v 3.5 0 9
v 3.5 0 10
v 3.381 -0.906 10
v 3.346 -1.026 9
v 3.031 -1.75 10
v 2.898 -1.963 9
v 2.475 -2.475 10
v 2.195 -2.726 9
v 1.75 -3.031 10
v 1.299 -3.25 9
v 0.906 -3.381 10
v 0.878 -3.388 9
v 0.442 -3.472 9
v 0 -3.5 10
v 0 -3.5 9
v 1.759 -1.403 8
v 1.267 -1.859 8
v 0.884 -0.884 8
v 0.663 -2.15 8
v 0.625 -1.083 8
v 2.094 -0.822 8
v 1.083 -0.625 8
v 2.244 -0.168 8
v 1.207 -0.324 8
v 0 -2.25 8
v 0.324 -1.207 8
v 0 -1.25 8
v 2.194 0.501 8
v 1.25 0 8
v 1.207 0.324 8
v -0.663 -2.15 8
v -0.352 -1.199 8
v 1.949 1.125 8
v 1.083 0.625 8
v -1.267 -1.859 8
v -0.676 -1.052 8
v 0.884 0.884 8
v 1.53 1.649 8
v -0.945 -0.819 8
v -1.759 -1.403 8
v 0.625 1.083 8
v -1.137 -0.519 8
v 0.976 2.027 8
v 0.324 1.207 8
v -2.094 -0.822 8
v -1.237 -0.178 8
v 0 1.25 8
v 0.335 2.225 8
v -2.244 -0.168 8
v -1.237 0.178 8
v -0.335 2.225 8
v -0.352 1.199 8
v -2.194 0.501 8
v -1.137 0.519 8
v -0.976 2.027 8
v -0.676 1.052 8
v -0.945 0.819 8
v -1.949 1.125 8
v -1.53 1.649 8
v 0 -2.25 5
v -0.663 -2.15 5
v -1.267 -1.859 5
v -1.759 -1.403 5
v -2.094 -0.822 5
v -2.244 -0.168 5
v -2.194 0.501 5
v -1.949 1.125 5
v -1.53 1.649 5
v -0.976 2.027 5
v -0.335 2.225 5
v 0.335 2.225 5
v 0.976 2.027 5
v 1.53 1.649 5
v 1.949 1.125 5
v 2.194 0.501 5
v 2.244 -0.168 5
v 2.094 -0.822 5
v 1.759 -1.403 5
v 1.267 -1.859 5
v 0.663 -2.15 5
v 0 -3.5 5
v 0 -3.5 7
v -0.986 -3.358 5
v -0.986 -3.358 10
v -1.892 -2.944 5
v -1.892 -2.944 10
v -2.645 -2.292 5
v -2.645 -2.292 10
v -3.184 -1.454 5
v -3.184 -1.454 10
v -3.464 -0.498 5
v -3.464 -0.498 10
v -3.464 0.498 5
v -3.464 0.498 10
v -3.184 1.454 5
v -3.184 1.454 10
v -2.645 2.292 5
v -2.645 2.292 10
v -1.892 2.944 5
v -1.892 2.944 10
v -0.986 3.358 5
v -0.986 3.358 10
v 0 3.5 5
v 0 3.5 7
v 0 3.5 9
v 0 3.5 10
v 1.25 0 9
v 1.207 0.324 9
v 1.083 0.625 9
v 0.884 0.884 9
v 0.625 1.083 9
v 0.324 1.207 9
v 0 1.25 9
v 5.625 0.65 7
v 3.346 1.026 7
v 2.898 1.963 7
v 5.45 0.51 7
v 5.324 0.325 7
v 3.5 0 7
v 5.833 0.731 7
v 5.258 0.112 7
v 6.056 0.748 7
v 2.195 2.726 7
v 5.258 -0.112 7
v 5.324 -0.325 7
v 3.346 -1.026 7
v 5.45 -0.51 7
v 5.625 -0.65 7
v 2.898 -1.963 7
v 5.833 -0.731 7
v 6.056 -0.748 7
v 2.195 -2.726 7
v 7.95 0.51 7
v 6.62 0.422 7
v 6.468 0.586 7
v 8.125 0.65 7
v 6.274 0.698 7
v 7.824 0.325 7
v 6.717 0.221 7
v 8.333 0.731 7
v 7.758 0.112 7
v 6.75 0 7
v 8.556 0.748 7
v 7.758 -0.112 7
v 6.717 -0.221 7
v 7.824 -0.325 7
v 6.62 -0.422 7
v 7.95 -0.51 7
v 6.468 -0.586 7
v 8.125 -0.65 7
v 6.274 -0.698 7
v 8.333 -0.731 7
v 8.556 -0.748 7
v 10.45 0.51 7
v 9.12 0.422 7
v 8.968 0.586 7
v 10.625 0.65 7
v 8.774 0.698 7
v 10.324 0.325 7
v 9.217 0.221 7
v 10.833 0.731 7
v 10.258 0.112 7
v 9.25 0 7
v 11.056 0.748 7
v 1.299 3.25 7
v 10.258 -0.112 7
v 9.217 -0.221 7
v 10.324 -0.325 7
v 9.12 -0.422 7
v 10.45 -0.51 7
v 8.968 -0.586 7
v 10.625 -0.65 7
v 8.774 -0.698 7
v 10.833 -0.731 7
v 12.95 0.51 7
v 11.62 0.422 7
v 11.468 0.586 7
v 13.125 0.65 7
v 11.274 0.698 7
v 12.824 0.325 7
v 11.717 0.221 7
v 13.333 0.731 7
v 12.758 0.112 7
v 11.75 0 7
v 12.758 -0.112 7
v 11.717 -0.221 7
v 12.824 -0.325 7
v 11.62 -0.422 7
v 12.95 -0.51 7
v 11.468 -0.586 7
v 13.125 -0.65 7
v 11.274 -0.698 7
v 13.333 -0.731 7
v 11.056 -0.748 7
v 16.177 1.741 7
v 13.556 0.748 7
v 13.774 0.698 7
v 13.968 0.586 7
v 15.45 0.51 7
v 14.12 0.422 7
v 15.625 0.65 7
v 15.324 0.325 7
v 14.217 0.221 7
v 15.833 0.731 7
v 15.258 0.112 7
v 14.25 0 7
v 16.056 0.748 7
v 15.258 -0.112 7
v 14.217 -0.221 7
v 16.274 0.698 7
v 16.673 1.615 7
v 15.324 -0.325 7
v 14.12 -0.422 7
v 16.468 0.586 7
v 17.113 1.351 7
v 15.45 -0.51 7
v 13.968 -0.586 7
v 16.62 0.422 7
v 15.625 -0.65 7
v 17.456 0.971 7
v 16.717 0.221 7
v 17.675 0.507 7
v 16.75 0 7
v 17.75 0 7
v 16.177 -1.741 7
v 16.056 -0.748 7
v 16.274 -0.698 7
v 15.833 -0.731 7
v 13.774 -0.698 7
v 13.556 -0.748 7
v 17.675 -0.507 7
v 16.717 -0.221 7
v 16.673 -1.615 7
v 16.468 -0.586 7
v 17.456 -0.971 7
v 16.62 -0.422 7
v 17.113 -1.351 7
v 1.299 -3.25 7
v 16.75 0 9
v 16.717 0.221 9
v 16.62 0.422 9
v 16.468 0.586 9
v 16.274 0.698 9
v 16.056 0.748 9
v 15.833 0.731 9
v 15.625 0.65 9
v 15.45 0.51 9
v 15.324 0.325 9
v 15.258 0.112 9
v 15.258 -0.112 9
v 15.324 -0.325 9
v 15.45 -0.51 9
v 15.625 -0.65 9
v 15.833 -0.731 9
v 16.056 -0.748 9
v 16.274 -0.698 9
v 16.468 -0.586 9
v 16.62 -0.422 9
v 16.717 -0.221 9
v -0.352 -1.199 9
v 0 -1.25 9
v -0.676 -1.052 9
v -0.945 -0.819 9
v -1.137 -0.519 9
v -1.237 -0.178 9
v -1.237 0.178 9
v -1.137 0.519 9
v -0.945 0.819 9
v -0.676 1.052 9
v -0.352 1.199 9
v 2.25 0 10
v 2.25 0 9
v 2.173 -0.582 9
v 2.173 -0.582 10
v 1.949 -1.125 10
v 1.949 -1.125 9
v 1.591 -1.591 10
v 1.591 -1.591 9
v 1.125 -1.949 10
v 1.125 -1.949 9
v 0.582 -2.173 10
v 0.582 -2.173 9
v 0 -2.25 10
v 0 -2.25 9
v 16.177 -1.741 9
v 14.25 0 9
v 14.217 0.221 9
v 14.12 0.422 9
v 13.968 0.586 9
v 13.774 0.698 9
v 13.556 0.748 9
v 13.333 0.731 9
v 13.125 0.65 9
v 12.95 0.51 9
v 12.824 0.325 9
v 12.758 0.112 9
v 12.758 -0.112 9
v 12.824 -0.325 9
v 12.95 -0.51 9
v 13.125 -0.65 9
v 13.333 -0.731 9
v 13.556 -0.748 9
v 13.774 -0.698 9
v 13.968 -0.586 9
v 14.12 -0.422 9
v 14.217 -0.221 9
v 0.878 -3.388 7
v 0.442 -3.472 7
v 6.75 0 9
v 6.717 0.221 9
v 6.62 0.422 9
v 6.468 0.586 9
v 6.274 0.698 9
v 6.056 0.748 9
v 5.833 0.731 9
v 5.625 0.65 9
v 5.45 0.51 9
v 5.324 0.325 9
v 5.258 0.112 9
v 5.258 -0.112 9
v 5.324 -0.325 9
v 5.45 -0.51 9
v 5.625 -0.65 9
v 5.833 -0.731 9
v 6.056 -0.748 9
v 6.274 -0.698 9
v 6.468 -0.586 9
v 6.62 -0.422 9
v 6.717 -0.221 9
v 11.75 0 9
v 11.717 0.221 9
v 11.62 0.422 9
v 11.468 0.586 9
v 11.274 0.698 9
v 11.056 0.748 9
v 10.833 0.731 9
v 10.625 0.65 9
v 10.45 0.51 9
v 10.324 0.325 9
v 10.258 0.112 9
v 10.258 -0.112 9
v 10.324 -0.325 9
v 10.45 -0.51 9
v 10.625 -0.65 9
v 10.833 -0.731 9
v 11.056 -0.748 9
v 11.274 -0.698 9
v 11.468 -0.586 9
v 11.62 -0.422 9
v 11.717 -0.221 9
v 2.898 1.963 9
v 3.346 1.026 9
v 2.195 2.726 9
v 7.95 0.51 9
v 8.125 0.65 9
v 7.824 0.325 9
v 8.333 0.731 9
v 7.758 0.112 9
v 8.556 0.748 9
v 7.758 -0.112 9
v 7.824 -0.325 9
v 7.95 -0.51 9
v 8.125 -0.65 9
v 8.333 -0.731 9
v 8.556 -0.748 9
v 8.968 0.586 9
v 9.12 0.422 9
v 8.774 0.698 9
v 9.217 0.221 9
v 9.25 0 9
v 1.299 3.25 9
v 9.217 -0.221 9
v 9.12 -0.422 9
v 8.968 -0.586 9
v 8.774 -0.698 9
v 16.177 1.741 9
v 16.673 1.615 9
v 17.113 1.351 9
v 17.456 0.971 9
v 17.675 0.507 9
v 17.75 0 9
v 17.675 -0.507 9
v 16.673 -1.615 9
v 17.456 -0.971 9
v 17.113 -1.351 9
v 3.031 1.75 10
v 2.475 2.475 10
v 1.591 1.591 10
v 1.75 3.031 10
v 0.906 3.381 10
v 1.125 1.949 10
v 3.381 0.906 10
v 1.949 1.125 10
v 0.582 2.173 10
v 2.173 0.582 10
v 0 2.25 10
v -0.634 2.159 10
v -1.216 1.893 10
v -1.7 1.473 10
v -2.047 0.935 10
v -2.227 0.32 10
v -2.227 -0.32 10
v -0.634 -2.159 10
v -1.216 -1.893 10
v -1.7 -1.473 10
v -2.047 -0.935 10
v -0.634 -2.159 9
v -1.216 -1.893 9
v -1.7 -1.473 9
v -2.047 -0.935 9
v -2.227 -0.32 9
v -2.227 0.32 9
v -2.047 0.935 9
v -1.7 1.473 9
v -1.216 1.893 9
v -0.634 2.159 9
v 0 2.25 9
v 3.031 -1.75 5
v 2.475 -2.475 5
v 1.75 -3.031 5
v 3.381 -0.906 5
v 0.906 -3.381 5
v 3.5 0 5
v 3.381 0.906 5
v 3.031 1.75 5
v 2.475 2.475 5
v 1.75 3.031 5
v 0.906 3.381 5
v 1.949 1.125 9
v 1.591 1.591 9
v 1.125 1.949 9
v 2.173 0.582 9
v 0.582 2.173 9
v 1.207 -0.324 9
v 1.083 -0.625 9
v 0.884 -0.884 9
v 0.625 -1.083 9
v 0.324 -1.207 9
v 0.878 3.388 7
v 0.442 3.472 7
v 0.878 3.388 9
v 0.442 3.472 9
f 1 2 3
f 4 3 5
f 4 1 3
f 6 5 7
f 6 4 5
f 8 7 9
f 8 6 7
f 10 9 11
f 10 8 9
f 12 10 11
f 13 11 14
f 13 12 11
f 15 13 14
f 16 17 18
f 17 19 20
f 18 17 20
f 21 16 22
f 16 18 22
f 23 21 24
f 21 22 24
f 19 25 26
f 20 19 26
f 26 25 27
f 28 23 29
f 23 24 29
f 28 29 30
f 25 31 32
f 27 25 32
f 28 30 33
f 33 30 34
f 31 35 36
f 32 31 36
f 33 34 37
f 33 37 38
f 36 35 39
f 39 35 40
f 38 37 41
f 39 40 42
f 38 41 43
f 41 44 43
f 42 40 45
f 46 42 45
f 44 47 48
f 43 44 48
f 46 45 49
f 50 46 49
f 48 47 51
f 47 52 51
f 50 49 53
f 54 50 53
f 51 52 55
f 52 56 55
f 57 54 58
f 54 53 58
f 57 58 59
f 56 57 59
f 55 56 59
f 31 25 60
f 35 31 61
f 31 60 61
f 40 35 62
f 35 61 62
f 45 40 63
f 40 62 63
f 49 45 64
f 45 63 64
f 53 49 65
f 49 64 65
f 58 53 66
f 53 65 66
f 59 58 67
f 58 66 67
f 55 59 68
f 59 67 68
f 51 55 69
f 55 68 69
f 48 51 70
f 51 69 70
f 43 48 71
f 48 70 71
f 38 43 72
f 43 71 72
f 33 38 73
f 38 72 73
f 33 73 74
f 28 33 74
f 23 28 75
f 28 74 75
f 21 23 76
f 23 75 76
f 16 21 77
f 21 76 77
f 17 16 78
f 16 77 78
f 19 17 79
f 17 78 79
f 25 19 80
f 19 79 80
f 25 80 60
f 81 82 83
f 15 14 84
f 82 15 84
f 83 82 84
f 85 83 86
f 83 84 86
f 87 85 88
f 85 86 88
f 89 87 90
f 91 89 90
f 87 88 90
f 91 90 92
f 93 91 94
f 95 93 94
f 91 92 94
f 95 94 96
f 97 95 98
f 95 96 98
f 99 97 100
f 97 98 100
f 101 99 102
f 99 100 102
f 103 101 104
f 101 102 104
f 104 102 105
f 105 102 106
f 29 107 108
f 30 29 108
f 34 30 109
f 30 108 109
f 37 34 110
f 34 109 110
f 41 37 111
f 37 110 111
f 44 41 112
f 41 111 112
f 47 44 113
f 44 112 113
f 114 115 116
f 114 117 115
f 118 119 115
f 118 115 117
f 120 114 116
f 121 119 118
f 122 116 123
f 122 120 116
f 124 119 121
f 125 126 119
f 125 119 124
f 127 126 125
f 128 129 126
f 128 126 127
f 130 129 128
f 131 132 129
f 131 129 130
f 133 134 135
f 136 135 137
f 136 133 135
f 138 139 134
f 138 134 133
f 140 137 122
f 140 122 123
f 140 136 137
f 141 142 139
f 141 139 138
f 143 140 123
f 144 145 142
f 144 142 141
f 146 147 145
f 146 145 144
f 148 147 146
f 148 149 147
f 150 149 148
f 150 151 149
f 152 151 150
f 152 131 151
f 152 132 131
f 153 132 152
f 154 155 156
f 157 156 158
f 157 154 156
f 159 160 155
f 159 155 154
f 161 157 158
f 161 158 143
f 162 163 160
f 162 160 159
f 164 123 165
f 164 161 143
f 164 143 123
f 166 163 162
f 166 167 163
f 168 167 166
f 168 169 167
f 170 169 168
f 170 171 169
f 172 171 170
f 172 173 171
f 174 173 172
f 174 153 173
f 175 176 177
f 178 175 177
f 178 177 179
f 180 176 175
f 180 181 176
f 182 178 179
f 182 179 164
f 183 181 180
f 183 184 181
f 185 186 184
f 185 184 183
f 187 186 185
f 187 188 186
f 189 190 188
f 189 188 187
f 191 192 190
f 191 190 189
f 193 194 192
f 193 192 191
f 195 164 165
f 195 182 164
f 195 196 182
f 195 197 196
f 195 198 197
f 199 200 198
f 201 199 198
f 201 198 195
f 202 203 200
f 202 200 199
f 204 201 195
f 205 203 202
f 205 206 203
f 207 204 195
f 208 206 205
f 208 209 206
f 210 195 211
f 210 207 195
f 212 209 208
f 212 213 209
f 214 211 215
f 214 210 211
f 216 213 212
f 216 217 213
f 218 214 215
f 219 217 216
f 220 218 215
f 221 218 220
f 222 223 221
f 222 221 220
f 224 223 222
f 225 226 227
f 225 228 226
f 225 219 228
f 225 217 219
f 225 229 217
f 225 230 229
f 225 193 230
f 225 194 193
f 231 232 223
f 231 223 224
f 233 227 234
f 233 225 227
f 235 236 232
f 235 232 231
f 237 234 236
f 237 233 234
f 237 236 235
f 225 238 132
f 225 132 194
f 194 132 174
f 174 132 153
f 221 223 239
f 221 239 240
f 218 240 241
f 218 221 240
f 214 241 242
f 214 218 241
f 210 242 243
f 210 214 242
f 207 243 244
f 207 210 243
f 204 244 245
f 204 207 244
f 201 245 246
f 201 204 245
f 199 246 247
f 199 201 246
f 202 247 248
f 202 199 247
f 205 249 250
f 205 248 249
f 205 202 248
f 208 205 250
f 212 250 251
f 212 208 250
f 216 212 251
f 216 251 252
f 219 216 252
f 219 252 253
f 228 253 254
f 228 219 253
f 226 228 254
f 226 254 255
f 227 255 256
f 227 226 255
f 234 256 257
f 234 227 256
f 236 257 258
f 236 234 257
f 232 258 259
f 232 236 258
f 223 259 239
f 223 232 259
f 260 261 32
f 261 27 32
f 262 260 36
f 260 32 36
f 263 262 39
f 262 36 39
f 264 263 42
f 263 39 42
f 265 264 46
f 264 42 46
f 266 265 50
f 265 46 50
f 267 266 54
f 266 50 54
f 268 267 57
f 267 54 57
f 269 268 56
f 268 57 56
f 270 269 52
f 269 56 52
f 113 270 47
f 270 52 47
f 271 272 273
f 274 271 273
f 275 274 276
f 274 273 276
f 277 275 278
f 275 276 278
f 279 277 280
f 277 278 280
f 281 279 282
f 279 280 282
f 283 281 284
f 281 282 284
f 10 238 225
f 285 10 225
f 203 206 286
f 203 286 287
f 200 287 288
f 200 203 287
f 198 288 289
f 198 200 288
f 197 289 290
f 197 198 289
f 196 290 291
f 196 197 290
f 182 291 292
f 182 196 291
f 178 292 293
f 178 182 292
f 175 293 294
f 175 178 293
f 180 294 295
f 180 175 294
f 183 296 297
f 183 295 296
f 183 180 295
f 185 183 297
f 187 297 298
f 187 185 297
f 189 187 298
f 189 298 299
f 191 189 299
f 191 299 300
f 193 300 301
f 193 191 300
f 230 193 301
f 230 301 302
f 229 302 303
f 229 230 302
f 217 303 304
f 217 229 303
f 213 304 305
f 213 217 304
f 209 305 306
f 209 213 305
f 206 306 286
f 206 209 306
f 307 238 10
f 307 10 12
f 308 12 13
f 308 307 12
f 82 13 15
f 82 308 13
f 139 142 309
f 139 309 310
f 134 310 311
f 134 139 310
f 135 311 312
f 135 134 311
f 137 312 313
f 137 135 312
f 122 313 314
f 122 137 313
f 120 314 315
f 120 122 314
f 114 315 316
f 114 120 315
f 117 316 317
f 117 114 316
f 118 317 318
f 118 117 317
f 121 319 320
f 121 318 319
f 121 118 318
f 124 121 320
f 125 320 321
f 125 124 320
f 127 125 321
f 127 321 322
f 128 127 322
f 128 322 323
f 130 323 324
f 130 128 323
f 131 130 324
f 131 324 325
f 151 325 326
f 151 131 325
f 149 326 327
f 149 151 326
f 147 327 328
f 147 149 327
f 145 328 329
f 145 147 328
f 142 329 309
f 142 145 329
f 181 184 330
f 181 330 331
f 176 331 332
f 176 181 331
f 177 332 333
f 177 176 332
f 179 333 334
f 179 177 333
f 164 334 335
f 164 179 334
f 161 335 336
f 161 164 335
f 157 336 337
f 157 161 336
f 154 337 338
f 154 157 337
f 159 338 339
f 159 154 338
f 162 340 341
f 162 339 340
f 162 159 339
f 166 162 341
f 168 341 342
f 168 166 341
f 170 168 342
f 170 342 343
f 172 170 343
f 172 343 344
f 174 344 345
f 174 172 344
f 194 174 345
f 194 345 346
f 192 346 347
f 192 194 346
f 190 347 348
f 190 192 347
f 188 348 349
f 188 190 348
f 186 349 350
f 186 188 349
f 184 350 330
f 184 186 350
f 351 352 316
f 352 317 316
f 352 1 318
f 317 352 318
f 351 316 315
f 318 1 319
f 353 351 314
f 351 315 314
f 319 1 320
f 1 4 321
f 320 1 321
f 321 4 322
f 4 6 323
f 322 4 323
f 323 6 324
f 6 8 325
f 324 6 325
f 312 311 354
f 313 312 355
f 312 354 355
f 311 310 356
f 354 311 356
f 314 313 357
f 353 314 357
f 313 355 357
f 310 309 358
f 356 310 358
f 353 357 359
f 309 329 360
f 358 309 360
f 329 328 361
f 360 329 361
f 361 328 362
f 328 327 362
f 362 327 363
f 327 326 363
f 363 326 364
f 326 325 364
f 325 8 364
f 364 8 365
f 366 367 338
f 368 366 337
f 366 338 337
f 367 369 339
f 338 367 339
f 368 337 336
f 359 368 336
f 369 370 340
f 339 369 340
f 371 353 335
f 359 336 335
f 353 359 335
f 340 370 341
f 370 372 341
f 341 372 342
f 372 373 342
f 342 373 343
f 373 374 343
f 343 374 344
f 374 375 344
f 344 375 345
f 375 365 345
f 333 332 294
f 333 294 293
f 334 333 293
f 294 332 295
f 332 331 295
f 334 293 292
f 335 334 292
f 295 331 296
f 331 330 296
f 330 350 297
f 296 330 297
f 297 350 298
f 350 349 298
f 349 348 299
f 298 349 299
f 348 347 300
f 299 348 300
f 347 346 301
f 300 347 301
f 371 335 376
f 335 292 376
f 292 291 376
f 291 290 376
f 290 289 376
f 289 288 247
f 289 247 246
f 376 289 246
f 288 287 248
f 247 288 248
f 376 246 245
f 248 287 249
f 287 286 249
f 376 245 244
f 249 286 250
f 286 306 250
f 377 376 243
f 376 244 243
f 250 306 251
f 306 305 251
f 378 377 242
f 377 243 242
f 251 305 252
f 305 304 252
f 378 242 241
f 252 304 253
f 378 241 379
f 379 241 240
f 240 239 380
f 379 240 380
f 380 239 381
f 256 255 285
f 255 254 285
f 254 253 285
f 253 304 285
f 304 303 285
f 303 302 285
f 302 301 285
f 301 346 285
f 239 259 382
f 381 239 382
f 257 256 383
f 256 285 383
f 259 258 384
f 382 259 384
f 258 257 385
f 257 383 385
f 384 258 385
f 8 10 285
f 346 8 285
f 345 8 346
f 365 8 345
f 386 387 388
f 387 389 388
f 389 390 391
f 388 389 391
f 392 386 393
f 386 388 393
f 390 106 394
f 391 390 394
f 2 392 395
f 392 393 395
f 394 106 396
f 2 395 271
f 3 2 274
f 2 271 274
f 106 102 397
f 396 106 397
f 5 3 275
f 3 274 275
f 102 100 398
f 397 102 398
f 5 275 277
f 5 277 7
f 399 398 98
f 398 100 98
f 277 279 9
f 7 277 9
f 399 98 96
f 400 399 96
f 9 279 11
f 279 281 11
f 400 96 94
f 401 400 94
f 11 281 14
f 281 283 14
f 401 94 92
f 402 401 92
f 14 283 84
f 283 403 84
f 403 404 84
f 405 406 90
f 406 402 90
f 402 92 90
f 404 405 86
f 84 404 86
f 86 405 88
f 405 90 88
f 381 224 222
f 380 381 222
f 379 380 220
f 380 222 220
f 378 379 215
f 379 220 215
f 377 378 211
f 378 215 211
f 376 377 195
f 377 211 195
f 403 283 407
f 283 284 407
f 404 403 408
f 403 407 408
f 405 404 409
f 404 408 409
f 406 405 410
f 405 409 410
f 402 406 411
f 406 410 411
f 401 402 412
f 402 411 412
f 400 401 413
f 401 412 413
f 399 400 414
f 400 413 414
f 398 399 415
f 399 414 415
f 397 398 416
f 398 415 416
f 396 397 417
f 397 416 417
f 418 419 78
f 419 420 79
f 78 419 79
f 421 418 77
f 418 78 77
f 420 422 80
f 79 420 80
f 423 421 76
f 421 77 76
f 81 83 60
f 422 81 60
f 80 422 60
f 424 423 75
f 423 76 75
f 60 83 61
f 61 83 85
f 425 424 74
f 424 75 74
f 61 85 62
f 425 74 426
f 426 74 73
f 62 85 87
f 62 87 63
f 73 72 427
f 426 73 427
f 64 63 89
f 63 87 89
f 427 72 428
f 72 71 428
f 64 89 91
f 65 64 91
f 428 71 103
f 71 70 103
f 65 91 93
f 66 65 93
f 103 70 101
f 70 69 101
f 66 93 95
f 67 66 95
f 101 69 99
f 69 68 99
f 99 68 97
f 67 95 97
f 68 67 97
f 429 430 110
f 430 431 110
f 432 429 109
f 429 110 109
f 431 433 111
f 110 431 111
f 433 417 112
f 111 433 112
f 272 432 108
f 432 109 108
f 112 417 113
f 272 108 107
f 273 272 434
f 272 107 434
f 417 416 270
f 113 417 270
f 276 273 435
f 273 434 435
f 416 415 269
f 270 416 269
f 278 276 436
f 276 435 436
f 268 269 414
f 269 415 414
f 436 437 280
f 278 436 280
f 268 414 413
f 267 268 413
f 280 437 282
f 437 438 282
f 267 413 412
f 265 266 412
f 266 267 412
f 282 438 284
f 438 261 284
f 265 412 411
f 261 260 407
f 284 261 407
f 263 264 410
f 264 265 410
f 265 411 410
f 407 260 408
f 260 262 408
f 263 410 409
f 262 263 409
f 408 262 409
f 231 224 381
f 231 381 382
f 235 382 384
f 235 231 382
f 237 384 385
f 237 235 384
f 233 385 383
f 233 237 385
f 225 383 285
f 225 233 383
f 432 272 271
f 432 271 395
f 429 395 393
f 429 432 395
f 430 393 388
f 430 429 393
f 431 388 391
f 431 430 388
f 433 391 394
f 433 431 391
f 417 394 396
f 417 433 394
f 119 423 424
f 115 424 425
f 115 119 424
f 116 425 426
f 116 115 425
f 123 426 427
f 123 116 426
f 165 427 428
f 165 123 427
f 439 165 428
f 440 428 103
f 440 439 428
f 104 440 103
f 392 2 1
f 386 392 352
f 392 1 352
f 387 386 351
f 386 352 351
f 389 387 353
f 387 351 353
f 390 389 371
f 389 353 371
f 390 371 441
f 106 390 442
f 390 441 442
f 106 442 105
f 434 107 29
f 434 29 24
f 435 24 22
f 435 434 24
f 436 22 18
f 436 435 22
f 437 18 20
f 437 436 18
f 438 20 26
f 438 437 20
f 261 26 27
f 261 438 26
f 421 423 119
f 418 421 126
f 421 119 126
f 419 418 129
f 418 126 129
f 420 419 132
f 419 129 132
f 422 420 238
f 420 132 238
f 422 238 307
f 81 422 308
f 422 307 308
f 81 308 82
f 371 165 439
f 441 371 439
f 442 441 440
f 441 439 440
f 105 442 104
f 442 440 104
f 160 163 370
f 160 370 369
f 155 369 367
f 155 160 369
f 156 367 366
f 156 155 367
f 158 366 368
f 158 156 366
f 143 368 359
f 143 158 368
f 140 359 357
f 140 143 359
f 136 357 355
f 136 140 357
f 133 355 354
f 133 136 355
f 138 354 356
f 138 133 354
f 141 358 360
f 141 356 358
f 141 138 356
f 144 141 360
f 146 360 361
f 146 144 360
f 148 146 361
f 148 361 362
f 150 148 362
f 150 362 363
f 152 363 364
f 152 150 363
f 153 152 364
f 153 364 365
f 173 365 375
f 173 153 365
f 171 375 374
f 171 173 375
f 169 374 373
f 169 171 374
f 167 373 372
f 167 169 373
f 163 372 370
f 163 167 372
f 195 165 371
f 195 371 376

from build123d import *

# Parameters (mm, degrees)
PAD004_DEPTH     = 2
PAD024_DEPTH     = 1
PAD025_DEPTH     = 2
SKETCH009_R      = 2.25
POCKET023_DEPTH  = 3
REVOLUTION_ANGLE = -180


with BuildPart() as part:
    # Sketch046 → Pad004 (new body)
    with BuildSketch(Plane.XY):
        with BuildLine():
            ThreePointArc((1.2990381057, 3.25), (0.6614378278, 3.4369317712), (0, 3.5))
            Line((0, 3.5), (0, 1.25))
            ThreePointArc((1.25, 0), (0.8838834765, 0.8838834765), (0, 1.25))
            Line((1.25, 0), (5.25, 0))
            ThreePointArc((6.75, 0), (6, 0.75), (5.25, 0))
            Line((6.75, 0), (7.75, 0))
            ThreePointArc((9.25, 0), (8.5, 0.75), (7.75, 0))
            Line((9.25, 0), (10.25, 0))
            ThreePointArc((11.75, 0), (11, 0.75), (10.25, 0))
            Line((11.75, 0), (12.75, 0))
            ThreePointArc((14.25, 0), (13.5, 0.75), (12.75, 0))
            Line((14.25, 0), (15.25, 0))
            ThreePointArc((16.75, 0), (16, 0.75), (15.25, 0))
            Line((16.75, 0), (17.75, 0))
            ThreePointArc((17.75, 0), (17.2983689647, 1.1733448051), (16.1765851067, 1.7410679769))
            Line((1.2990381057, 3.25), (16.1765851067, 1.7410679769))
        make_face()
    extrude(amount=PAD004_DEPTH)

    # Sketch047 → Pad024 (join)
    with BuildSketch(Plane.XY.offset(2)):
        with BuildLine():
            ThreePointArc((3.5, 0), (2.4748737342, 2.4748737342), (0, 3.5))
            Line((0, 3.5), (0, 2.25))
            ThreePointArc((2.25, 0), (1.5909902577, 1.5909902577), (0, 2.25))
            Line((2.25, 0), (3.5, 0))
        make_face()
    extrude(amount=PAD024_DEPTH)

    # Sketch048 → Pad025 (join)
    with BuildSketch(Plane.XY):
        with BuildLine():
            ThreePointArc((3.5, 0), (2.4748737342, 2.4748737342), (0, 3.5))
            Line((0, 3.5), (0, 1.25))
            ThreePointArc((1.25, 0), (0.8838834765, 0.8838834765), (0, 1.25))
            Line((3.5, 0), (1.25, 0))
        make_face()
    extrude(amount=-PAD025_DEPTH)

    # Sketch009 → Pocket023 (cut)
    with BuildSketch(Plane.XY.offset(-2)):
        Circle(SKETCH009_R)
    extrude(amount=POCKET023_DEPTH, mode=Mode.SUBTRACT)

    # Mirrored009: part across Sketch009 H_Axis


with BuildPart() as part_1:
    add(part.part)
    add(part.part.mirror(Plane(origin=(0, 0, -2), x_dir=(0, 0, 1), z_dir=(0, 1, 0))))

    # Mirrored009 Face3 → Revolution (revolve)
    with BuildSketch(Plane(origin=(0, -2.7198275862, 0.6379310345), x_dir=(0, 1, 0), z_dir=(-1, 0, 0))):
        Polygon((0.4698275862, 2.6379310345), (-0.7801724138, 2.6379310345), (-0.7801724138, -2.3620689655), (0.4698275862, -2.3620689655), (0.4698275862, -1.3620689655), (1.4698275862, -1.3620689655), (1.4698275862, -0.3620689655), (0.4698275862, -0.3620689655), align=None)
    revolve(axis=Axis((0, 0, 0), (0, 0, 1)), revolution_arc=REVOLUTION_ANGLE)


with BuildPart() as part_2:
    # Body002 placement: moved
    add(part_1.part.moved(Location((0, 0, 7))))


solid = part_2.part
